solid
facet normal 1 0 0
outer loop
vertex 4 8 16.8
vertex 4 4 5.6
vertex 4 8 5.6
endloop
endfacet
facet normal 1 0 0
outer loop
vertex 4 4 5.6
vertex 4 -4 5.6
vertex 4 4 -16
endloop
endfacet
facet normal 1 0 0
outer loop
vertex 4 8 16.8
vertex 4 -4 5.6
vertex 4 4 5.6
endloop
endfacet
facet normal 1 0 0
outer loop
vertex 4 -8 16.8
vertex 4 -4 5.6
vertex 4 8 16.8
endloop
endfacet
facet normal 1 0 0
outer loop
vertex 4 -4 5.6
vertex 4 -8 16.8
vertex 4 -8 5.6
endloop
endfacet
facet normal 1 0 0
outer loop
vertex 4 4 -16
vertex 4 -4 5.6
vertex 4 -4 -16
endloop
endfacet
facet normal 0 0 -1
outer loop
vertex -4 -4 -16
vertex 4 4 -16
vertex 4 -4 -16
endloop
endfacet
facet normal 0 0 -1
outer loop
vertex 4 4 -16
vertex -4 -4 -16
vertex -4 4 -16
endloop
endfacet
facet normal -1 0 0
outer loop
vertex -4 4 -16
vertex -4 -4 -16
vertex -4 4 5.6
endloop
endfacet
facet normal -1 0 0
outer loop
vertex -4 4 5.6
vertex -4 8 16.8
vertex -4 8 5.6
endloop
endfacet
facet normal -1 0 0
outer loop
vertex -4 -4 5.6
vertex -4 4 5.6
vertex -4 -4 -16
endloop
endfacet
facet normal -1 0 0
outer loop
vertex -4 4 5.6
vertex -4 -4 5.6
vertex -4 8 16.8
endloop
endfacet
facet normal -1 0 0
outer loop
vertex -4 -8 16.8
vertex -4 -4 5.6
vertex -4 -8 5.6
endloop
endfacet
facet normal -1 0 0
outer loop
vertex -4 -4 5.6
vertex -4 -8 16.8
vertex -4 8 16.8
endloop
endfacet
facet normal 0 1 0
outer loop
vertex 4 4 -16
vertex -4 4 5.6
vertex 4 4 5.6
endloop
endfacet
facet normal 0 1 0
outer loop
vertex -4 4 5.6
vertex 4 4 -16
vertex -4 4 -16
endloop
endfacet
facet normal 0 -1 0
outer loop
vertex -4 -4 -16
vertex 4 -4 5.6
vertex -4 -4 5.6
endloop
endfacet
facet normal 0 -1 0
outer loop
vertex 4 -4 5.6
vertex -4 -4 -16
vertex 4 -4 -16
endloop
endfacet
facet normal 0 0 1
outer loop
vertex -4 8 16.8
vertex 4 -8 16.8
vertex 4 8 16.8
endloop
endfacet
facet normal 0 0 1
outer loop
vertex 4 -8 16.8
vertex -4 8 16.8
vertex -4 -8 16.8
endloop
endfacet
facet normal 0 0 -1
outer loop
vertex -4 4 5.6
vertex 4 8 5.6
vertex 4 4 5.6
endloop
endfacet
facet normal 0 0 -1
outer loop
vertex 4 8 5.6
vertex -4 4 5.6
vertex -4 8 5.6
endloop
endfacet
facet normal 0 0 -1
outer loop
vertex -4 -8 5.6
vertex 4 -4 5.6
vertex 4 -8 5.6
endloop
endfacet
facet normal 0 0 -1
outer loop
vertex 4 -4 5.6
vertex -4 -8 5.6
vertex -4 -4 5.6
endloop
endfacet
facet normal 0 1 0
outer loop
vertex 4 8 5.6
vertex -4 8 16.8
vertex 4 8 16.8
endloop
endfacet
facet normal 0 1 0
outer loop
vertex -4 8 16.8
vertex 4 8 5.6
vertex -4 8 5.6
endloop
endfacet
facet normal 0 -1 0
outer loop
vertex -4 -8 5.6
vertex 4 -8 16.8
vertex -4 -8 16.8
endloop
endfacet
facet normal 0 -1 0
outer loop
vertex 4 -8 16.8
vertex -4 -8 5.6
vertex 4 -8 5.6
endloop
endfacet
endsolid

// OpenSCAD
size = 32;//block=32 //item=8

cube([size * 0.25, size * 0.25, size * 1], center = true);//base


translate([0, 0, size * 0.35]) {//flangeLokingMF
  cube([size * 0.25, size * 0.5, size * 0.35], center = true);
}
;//translate
